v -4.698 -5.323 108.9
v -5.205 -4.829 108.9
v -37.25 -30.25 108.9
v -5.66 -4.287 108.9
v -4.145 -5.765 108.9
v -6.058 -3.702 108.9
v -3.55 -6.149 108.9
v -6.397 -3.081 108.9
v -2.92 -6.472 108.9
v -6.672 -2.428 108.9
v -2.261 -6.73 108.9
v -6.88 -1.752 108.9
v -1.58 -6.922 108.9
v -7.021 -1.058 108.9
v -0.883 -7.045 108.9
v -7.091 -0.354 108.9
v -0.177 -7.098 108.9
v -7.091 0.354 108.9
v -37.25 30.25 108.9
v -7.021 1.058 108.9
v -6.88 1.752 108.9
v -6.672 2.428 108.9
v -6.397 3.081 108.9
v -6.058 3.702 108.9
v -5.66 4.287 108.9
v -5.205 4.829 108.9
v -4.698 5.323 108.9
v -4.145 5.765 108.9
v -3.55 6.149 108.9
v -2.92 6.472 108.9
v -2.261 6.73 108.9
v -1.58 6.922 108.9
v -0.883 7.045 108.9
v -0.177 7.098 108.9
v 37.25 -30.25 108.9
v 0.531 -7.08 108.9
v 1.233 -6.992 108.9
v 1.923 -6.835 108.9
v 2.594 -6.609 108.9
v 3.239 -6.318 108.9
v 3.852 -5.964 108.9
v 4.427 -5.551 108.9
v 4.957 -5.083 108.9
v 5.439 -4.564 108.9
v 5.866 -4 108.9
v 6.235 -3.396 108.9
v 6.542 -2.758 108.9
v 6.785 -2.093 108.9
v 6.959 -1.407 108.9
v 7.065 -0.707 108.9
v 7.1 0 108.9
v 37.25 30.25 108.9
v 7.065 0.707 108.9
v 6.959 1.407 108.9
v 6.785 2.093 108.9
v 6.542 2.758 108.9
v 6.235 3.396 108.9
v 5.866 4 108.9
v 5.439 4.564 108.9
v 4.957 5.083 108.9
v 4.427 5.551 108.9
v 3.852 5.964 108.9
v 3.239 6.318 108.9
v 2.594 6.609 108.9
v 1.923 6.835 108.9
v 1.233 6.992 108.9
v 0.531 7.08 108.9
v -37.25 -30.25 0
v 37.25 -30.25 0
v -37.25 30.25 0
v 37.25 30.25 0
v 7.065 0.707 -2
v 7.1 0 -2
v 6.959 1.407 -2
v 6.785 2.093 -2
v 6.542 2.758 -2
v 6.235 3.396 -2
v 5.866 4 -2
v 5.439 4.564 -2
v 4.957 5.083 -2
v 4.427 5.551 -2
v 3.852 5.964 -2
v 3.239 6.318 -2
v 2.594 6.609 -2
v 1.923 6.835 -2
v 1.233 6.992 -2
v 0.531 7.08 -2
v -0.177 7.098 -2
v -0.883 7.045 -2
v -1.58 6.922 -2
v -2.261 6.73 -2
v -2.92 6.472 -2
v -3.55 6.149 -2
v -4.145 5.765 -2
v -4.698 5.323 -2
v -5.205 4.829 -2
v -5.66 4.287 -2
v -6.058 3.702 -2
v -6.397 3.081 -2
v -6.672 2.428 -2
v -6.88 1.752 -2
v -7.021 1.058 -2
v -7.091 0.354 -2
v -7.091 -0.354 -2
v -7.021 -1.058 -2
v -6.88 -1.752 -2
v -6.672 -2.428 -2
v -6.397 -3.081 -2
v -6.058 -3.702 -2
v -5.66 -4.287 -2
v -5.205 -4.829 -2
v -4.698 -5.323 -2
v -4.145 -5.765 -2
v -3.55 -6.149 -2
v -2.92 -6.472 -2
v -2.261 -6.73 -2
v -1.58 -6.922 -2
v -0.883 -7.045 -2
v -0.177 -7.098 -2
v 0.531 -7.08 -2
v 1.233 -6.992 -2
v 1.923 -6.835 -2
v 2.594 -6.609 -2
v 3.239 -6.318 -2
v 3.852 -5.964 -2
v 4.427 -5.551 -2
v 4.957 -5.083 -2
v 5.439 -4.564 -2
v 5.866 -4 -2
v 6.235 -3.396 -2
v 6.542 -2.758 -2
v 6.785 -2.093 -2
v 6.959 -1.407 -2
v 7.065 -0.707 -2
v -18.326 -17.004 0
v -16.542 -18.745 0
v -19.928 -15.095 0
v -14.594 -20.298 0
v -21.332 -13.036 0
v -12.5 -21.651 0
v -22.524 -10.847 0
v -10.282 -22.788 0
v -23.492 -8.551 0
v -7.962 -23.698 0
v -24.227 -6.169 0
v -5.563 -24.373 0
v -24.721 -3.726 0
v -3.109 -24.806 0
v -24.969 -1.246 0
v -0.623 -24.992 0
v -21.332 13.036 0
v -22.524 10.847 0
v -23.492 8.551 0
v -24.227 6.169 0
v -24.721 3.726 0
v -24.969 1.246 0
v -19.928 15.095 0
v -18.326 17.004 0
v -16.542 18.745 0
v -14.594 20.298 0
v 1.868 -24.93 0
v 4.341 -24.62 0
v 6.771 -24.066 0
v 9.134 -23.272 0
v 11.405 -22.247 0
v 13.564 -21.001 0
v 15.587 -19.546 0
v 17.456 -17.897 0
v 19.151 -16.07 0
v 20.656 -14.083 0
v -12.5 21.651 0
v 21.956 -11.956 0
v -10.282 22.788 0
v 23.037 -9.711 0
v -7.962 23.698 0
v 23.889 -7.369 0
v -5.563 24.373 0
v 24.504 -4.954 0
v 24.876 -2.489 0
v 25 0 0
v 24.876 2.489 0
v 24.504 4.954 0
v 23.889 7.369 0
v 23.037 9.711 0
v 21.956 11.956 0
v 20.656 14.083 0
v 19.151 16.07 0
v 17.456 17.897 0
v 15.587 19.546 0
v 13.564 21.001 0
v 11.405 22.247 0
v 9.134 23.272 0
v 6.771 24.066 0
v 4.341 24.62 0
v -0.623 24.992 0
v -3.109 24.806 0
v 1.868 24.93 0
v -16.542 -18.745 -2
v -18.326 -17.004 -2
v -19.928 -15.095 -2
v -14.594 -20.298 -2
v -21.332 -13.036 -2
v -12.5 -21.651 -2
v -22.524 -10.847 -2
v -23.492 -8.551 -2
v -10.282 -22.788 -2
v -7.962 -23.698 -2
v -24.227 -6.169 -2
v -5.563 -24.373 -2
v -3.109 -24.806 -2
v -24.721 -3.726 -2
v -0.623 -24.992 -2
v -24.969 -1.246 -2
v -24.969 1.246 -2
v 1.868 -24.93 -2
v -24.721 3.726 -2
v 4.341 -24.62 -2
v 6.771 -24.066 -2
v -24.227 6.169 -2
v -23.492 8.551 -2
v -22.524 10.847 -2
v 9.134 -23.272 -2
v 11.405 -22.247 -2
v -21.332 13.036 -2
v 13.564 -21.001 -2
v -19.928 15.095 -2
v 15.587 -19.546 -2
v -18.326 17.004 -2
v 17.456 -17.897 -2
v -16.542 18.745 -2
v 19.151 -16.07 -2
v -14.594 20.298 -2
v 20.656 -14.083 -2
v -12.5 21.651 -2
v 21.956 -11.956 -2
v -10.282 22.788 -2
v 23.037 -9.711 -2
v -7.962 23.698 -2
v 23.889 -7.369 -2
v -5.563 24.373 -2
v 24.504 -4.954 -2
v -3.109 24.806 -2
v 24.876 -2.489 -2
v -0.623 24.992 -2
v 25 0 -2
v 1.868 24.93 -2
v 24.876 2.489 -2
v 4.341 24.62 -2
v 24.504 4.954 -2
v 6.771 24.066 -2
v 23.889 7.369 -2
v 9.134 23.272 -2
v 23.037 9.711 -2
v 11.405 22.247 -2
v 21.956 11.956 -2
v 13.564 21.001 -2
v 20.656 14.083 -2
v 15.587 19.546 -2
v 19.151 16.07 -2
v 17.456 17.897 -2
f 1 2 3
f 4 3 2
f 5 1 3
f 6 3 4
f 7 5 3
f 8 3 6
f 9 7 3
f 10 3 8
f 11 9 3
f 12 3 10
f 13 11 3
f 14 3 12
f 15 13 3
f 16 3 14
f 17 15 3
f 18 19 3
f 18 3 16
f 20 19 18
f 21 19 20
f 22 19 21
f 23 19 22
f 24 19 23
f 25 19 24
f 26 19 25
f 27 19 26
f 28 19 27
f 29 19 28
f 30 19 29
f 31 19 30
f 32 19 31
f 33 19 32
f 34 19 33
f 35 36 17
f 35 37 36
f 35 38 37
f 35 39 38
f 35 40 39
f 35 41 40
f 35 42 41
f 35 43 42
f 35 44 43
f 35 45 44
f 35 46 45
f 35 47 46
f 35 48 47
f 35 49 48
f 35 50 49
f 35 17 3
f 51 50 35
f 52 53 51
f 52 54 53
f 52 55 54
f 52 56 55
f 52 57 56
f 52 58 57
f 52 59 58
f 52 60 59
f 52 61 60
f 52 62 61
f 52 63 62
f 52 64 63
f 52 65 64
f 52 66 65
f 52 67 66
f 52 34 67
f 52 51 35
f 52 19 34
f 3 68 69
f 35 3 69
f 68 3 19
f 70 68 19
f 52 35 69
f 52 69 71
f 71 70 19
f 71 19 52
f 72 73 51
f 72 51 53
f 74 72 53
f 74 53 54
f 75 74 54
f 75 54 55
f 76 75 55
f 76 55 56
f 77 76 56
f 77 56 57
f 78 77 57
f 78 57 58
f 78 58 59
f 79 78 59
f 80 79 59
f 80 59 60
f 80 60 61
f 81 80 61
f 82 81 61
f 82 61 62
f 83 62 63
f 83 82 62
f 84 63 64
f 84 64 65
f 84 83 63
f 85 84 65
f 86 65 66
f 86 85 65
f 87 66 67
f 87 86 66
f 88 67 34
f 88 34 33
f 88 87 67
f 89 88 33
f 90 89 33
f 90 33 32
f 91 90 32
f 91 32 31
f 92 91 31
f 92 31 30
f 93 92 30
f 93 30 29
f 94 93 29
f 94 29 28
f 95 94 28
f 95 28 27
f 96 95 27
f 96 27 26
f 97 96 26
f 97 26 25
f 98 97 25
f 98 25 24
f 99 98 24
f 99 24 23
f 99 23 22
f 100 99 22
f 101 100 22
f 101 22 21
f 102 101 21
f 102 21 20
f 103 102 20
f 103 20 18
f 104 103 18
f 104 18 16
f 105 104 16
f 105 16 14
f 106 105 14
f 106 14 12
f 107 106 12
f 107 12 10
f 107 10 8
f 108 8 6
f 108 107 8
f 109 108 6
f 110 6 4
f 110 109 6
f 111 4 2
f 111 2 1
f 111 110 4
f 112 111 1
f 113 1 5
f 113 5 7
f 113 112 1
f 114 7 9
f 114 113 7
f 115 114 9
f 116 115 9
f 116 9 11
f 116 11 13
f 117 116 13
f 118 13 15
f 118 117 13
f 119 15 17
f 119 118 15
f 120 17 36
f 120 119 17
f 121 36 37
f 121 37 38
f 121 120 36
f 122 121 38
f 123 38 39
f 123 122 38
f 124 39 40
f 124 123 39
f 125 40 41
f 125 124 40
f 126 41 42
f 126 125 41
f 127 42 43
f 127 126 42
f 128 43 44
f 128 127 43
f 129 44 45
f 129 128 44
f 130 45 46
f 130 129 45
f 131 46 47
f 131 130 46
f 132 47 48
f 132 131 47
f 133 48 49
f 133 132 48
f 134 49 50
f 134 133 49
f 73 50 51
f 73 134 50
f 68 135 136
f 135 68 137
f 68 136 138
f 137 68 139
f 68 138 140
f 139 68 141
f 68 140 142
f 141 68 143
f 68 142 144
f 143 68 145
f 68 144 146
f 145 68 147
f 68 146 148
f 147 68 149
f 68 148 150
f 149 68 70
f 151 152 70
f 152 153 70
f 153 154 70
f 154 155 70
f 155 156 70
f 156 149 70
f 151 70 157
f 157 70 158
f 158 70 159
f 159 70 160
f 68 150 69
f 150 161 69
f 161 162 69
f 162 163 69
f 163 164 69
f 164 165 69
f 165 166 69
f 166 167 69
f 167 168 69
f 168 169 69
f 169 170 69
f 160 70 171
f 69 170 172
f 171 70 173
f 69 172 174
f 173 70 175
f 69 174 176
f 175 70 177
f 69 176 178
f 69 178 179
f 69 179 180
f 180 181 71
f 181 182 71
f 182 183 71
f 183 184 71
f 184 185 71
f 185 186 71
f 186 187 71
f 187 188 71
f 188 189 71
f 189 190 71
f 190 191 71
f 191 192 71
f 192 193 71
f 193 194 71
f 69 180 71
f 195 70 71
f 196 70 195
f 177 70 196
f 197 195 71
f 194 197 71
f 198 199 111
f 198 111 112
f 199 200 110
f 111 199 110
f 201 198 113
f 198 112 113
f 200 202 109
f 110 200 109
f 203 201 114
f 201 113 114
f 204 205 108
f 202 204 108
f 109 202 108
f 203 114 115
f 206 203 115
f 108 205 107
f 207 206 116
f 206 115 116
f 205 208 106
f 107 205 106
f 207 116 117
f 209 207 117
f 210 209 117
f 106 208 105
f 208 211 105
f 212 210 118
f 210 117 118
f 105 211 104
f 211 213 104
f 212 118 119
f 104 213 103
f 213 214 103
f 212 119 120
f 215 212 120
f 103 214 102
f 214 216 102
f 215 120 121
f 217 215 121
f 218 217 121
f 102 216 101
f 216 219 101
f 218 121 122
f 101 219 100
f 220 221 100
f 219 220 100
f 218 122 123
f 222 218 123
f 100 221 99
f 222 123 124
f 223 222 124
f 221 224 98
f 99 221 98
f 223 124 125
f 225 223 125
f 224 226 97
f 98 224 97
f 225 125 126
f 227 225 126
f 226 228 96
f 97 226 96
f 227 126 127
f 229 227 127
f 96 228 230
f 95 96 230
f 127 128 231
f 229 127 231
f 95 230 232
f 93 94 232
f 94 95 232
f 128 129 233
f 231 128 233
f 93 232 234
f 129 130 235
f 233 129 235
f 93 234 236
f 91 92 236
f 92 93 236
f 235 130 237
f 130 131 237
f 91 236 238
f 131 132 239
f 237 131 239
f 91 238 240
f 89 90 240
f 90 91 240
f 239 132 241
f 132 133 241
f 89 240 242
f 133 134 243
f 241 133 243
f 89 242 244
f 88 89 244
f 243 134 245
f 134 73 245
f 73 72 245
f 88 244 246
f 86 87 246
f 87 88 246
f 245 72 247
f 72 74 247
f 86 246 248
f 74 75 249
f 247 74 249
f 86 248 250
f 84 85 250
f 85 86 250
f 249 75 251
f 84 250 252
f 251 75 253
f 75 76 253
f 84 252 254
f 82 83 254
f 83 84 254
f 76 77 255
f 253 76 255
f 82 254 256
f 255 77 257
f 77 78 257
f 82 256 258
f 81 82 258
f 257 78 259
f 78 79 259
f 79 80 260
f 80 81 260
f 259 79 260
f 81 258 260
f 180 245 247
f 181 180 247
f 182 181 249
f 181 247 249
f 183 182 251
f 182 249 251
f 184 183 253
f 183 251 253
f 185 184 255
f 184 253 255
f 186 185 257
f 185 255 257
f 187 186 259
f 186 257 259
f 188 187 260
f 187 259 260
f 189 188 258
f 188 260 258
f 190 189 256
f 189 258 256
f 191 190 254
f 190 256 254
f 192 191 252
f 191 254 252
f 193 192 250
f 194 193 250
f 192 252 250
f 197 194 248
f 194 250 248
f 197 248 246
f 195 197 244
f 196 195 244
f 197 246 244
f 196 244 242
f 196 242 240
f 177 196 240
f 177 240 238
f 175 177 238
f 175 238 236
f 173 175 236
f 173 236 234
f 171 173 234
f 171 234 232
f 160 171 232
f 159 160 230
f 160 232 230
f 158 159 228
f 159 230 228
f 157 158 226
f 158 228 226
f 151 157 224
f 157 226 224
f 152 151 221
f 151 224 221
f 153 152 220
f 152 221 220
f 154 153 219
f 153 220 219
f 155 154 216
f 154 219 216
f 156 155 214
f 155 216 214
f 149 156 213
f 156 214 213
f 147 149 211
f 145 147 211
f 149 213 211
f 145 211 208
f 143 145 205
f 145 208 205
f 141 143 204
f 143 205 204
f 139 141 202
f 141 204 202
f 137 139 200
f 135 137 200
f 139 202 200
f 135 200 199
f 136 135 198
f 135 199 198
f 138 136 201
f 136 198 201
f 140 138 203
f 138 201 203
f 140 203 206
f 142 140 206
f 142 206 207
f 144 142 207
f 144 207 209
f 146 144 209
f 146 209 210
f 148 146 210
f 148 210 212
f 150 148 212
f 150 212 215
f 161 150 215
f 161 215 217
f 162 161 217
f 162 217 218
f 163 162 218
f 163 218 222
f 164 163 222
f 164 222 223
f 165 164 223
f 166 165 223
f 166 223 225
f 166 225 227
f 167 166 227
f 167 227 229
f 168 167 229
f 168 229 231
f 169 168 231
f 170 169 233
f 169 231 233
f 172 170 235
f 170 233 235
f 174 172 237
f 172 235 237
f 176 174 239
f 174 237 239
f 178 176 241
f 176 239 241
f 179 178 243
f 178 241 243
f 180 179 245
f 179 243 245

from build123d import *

# Parameters (mm, degrees)
SKETCH1_W                                     = 74.5
SKETCH1_H                                     = 60.5
SKETCH1_R                                     = 7.1
CONSERVATIVE_MANUFACTURER_CASE_ENVELOPE_DEPTH = 108.9
D50_PILOT_ENVELOPE_START                      = -2
SKETCH2_R                                     = 25
SKETCH2_R_2                                   = 7.1
D50_PILOT_ENVELOPE_DEPTH                      = 2


with BuildPart() as part:
    # Sketch1 → Conservative_Manufacturer_Case_Envelope (new body)
    with BuildSketch(Plane.XY):
        Rectangle(SKETCH1_W, SKETCH1_H)
        Circle(SKETCH1_R, mode=Mode.SUBTRACT)
    extrude(amount=CONSERVATIVE_MANUFACTURER_CASE_ENVELOPE_DEPTH)

    # Sketch2 → D50_Pilot_Envelope (add)
    with BuildSketch(Plane.XY.offset(D50_PILOT_ENVELOPE_START)):
        Circle(SKETCH2_R)
        Circle(SKETCH2_R_2, mode=Mode.SUBTRACT)
    extrude(amount=D50_PILOT_ENVELOPE_DEPTH)


solid = part.part
